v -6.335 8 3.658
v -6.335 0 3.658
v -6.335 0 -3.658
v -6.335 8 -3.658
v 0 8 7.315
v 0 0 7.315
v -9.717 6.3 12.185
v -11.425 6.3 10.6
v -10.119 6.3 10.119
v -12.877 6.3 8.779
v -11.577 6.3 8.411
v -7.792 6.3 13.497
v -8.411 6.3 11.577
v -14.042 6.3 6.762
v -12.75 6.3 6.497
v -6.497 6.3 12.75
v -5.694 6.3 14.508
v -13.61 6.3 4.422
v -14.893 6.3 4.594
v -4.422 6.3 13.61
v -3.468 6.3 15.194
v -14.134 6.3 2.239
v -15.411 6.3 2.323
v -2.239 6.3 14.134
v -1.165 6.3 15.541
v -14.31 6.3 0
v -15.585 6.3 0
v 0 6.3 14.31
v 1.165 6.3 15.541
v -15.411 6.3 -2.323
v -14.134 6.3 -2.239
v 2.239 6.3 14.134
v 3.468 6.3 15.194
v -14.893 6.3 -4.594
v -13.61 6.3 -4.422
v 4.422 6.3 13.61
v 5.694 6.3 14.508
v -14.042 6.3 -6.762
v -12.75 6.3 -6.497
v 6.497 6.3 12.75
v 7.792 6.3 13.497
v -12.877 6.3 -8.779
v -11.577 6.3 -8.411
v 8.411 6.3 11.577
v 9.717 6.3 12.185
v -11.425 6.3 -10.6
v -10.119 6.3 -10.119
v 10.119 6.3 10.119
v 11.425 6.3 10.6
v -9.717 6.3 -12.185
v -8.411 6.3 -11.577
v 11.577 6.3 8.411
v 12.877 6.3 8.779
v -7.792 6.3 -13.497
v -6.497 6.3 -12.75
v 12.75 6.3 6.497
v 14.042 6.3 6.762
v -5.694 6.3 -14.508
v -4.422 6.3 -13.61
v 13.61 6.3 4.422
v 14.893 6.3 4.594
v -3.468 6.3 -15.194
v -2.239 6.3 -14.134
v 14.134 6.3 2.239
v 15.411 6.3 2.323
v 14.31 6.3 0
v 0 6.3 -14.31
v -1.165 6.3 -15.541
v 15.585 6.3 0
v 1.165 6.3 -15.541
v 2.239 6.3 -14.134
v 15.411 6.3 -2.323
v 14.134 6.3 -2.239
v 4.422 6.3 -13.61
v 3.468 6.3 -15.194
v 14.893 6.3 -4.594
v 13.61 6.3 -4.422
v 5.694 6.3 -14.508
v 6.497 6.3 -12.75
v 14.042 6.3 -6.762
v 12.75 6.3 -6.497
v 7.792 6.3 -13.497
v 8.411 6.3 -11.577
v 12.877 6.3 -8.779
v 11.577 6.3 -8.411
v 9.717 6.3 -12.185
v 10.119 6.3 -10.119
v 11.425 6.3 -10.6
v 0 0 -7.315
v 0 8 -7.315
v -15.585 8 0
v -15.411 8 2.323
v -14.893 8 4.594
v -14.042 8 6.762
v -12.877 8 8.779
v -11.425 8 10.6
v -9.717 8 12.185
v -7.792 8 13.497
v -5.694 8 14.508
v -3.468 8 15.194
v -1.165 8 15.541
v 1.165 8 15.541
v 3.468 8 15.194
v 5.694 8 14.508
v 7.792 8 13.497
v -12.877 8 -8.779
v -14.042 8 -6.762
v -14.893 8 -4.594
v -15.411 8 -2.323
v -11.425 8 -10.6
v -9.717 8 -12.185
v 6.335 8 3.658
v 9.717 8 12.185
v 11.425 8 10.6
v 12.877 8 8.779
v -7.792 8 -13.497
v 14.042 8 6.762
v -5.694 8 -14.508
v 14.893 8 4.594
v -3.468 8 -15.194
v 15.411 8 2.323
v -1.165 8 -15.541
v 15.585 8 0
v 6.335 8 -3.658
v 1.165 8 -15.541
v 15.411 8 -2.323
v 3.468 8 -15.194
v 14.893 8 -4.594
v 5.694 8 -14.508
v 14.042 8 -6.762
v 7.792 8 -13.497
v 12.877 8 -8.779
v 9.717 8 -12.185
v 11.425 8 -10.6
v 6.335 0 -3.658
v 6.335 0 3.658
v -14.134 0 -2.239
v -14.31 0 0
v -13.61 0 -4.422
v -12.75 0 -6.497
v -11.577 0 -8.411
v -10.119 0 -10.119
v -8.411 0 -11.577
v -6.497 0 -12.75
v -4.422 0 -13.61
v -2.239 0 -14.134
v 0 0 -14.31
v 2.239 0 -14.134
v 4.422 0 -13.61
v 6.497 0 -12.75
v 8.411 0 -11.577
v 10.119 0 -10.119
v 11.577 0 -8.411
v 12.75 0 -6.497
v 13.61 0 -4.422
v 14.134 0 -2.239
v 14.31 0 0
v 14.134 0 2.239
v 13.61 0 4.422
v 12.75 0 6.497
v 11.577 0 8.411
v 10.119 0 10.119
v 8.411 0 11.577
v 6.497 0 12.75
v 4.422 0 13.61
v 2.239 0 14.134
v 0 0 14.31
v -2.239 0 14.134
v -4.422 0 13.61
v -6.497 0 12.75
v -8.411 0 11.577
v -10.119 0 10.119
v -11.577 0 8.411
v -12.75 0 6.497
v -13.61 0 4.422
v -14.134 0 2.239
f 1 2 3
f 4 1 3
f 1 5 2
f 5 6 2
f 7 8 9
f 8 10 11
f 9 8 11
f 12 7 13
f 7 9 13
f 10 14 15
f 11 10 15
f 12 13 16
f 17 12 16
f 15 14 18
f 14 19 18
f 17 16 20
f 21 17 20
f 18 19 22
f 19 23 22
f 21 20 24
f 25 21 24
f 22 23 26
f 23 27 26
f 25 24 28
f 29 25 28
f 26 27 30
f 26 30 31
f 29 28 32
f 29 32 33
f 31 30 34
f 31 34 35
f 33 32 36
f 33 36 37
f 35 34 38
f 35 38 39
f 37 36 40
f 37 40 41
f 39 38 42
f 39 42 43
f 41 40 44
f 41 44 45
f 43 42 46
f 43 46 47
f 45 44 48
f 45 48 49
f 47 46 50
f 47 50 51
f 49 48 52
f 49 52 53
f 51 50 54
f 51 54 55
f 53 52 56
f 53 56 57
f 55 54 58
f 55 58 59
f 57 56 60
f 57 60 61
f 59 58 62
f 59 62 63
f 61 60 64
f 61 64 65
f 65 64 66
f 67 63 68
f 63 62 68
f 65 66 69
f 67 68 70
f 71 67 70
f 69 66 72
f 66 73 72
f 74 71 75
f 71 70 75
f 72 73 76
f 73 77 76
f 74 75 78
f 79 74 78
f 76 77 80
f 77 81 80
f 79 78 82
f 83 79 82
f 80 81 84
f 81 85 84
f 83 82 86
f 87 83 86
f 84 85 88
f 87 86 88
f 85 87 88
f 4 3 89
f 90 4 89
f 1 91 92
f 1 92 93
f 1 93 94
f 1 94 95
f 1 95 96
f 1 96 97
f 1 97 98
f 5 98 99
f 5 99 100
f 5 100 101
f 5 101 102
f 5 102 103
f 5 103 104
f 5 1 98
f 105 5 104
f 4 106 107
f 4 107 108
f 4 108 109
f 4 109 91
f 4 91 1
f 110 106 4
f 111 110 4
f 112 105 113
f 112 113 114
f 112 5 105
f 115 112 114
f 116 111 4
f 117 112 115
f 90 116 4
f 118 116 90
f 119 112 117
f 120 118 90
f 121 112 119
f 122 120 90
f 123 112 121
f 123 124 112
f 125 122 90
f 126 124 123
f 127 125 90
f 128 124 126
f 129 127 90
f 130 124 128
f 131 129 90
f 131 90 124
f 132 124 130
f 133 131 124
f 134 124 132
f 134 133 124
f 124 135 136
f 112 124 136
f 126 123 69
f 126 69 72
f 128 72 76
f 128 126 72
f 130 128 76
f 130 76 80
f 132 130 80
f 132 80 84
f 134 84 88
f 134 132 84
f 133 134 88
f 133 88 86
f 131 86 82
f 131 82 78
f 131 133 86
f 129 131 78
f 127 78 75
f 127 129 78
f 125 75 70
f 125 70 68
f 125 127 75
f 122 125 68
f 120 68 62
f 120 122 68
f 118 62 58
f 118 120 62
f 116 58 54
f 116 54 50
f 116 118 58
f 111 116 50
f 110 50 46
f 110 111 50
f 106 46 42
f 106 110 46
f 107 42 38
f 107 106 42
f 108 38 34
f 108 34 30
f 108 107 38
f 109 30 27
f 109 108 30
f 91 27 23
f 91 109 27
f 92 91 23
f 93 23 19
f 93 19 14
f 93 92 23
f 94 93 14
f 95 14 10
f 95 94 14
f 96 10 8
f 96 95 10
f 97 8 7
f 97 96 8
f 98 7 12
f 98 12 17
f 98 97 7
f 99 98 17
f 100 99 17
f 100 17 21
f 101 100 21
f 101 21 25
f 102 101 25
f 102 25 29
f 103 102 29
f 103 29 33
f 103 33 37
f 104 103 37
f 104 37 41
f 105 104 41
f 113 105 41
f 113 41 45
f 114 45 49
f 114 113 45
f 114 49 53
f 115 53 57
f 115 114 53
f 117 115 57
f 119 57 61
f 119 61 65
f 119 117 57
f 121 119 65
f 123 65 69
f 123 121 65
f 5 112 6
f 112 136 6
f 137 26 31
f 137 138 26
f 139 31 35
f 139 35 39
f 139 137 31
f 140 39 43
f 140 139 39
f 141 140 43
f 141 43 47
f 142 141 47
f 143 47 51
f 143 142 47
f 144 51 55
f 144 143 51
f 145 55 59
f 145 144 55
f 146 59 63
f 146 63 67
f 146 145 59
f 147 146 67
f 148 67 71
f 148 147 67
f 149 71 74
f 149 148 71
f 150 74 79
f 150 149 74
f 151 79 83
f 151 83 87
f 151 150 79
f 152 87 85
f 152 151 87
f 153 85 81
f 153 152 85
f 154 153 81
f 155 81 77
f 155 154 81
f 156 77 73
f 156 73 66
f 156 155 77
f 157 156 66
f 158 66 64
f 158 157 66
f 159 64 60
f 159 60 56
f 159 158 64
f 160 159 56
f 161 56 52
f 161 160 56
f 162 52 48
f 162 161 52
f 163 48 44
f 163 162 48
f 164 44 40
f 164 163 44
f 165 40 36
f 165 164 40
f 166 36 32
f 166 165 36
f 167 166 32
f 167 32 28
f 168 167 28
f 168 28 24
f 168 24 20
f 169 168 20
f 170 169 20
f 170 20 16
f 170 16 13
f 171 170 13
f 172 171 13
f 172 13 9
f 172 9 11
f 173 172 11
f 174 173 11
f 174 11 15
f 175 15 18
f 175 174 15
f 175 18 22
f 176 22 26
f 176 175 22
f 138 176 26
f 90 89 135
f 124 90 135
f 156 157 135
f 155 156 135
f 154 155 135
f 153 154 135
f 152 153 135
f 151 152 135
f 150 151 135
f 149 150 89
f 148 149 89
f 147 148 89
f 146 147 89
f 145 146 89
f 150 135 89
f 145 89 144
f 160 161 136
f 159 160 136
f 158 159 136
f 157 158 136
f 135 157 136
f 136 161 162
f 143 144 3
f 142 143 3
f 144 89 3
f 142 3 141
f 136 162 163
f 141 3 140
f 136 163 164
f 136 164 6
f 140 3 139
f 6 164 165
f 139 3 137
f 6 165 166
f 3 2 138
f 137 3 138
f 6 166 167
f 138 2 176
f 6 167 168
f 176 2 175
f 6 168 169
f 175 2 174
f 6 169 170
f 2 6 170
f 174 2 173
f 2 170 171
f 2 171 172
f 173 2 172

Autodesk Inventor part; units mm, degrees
ref_plane "YZ Plane" through (0, 0, 0) normal (1, 0, 0) x (0, 1, 0)
ref_plane "XZ Plane" through (0, 0, 0) normal (0, 1, 0) x (-1, 0, 0)
ref_plane "XY Plane" through (0, 0, 0) normal (0, 0, 1) x (1, 0, 0)
sketch "Sketch1" plane through (0, 0, 0) normal (0, 1, 0) x (-1, 0, 0)
  circle A0 centre (0, 0) radius 14.31
  line L0 (0, 0) -> (6.335, 0)
  line L1 (6.335, -3.6575) -> (0, -7.315)
  line L2 (0, -7.315) -> (-6.335, -3.6575)
  line L3 (-6.335, -3.6575) -> (-6.335, 3.6575)
  line L4 (-6.335, 3.6575) -> (0, 7.315)
  line L5 (0, 7.315) -> (6.335, 3.6575)
  line L6 (6.335, 3.6575) -> (6.335, -3.6575)
  dimension "d0" = 28.62
  dimension "d1" = 6.335
extrude "Extrusion1" add sketch "Sketch1" along normal blind 8
sketch "Sketch2" plane through (0, 8, 0) normal (0, 1, 0) x (1, 0, 0)
  circle A0 centre (0, 0) radius 15.585
  line L0 (-6.335, -3.6575) -> (-6.335, 3.6575) projected
  line L1 (-6.335, 3.6575) -> (0, 7.315)
  line L2 (0, 7.315) -> (6.335, 3.6575)
  line L3 (6.335, 3.6575) -> (6.335, -3.6575)
  line L4 (6.335, -3.6575) -> (0, -7.315)
  line L5 (0, -7.315) -> (-6.335, -3.6575)
  line L6 (-6.335, -3.6575) -> (-6.335, 3.6575)
  point P0 (-6.335, 0)
  dimension "d4" = 31.17
extrude "Extrusion2" add sketch "Sketch2" against normal blind 1.7
properties part number "Bearing"
